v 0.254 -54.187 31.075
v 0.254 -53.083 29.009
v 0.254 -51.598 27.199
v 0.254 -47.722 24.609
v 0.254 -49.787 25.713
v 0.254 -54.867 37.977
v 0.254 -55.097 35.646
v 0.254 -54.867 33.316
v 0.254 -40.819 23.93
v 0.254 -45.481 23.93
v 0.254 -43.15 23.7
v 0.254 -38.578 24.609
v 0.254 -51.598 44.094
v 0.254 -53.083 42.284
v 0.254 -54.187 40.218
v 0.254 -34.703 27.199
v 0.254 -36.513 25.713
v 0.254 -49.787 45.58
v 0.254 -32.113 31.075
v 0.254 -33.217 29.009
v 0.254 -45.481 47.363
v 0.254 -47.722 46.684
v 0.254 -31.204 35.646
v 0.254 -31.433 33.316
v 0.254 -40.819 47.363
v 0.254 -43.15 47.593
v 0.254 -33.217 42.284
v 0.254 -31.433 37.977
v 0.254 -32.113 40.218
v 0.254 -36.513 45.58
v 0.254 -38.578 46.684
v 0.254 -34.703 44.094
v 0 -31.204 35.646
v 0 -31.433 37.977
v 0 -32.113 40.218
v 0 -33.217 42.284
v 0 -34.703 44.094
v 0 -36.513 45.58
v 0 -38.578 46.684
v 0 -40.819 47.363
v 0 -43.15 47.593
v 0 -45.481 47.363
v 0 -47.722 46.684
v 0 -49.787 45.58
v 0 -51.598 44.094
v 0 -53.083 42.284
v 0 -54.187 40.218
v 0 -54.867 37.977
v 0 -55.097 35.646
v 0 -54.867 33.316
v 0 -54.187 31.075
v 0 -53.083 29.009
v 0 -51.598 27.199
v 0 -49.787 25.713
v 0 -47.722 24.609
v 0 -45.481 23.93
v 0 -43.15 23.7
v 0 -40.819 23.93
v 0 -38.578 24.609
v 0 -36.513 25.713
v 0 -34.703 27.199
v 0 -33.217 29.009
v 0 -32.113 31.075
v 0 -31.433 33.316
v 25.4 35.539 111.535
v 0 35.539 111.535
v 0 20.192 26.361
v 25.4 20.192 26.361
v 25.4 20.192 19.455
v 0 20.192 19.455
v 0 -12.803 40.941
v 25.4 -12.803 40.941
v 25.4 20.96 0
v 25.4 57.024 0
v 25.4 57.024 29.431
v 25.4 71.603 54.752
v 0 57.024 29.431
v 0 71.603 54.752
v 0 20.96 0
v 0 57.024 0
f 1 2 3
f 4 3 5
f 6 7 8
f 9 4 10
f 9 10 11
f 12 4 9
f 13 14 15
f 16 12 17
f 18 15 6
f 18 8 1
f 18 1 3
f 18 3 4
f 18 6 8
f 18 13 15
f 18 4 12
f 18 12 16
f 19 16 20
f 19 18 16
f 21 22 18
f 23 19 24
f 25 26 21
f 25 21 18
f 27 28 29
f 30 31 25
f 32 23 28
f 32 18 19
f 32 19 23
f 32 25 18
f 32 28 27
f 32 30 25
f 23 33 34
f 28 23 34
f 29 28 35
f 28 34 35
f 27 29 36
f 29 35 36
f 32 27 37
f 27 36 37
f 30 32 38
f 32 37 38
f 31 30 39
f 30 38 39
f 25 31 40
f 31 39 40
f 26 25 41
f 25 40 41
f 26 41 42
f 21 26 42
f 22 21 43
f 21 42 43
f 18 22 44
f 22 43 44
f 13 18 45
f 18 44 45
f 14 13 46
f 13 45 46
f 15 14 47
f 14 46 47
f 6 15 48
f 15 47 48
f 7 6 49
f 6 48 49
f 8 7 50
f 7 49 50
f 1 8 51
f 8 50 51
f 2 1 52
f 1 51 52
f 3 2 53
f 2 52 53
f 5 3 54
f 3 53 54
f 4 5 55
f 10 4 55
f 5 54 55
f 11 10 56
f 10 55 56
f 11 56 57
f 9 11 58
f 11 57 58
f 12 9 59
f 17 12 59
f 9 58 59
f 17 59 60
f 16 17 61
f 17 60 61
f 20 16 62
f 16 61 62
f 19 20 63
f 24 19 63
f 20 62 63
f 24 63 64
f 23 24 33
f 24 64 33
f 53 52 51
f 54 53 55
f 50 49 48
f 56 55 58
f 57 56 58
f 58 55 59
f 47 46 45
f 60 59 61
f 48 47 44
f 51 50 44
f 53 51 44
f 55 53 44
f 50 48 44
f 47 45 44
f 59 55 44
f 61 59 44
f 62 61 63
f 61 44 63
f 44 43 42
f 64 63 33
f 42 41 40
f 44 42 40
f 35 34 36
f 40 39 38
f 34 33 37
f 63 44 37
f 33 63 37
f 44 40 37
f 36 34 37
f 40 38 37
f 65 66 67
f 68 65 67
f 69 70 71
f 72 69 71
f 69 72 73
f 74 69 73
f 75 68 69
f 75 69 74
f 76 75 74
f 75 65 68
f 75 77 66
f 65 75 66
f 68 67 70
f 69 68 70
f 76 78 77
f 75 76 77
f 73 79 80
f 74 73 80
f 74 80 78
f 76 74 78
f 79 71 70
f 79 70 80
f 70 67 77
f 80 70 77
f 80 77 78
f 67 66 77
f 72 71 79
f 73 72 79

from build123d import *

# Parameters (mm, degrees)
F0_R     = 14.0897496008
F1_DEPTH = 0.254
F3_R     = 11.9464548424
F4_DEPTH = 0.254
F6_DEPTH = 25.4


with BuildPart() as f1:
    # F0 (on Right) → F1 (new body)
    with BuildSketch(Plane.YZ):
        with Locations((-60.5094321072, 38.5479815304)):
            Circle(F0_R)
    extrude(amount=F1_DEPTH)


with BuildPart() as f4:
    # F3 (on Right) → F4 (new body)
    with BuildSketch(Plane.YZ):
        with Locations((-43.1501194835, 35.6464311481)):
            Circle(F3_R)
    extrude(amount=F4_DEPTH)


with BuildPart() as f6:
    # F5 (on Right) → F6 (new body)
    with BuildSketch(Plane.YZ):
        Polygon((35.5388149619, 111.5346327424), (20.1922897249, 26.3614114374), (20.1922897249, 19.4554757327), (-12.8027312458, 40.9406162798), (20.9596306086, 0), (57.023961097, 0), (71.6031491756, 54.7524876893), (57.023961097, 29.4307190925), align=None)
    extrude(amount=F6_DEPTH)


solid = Compound([f4.part, f6.part])
